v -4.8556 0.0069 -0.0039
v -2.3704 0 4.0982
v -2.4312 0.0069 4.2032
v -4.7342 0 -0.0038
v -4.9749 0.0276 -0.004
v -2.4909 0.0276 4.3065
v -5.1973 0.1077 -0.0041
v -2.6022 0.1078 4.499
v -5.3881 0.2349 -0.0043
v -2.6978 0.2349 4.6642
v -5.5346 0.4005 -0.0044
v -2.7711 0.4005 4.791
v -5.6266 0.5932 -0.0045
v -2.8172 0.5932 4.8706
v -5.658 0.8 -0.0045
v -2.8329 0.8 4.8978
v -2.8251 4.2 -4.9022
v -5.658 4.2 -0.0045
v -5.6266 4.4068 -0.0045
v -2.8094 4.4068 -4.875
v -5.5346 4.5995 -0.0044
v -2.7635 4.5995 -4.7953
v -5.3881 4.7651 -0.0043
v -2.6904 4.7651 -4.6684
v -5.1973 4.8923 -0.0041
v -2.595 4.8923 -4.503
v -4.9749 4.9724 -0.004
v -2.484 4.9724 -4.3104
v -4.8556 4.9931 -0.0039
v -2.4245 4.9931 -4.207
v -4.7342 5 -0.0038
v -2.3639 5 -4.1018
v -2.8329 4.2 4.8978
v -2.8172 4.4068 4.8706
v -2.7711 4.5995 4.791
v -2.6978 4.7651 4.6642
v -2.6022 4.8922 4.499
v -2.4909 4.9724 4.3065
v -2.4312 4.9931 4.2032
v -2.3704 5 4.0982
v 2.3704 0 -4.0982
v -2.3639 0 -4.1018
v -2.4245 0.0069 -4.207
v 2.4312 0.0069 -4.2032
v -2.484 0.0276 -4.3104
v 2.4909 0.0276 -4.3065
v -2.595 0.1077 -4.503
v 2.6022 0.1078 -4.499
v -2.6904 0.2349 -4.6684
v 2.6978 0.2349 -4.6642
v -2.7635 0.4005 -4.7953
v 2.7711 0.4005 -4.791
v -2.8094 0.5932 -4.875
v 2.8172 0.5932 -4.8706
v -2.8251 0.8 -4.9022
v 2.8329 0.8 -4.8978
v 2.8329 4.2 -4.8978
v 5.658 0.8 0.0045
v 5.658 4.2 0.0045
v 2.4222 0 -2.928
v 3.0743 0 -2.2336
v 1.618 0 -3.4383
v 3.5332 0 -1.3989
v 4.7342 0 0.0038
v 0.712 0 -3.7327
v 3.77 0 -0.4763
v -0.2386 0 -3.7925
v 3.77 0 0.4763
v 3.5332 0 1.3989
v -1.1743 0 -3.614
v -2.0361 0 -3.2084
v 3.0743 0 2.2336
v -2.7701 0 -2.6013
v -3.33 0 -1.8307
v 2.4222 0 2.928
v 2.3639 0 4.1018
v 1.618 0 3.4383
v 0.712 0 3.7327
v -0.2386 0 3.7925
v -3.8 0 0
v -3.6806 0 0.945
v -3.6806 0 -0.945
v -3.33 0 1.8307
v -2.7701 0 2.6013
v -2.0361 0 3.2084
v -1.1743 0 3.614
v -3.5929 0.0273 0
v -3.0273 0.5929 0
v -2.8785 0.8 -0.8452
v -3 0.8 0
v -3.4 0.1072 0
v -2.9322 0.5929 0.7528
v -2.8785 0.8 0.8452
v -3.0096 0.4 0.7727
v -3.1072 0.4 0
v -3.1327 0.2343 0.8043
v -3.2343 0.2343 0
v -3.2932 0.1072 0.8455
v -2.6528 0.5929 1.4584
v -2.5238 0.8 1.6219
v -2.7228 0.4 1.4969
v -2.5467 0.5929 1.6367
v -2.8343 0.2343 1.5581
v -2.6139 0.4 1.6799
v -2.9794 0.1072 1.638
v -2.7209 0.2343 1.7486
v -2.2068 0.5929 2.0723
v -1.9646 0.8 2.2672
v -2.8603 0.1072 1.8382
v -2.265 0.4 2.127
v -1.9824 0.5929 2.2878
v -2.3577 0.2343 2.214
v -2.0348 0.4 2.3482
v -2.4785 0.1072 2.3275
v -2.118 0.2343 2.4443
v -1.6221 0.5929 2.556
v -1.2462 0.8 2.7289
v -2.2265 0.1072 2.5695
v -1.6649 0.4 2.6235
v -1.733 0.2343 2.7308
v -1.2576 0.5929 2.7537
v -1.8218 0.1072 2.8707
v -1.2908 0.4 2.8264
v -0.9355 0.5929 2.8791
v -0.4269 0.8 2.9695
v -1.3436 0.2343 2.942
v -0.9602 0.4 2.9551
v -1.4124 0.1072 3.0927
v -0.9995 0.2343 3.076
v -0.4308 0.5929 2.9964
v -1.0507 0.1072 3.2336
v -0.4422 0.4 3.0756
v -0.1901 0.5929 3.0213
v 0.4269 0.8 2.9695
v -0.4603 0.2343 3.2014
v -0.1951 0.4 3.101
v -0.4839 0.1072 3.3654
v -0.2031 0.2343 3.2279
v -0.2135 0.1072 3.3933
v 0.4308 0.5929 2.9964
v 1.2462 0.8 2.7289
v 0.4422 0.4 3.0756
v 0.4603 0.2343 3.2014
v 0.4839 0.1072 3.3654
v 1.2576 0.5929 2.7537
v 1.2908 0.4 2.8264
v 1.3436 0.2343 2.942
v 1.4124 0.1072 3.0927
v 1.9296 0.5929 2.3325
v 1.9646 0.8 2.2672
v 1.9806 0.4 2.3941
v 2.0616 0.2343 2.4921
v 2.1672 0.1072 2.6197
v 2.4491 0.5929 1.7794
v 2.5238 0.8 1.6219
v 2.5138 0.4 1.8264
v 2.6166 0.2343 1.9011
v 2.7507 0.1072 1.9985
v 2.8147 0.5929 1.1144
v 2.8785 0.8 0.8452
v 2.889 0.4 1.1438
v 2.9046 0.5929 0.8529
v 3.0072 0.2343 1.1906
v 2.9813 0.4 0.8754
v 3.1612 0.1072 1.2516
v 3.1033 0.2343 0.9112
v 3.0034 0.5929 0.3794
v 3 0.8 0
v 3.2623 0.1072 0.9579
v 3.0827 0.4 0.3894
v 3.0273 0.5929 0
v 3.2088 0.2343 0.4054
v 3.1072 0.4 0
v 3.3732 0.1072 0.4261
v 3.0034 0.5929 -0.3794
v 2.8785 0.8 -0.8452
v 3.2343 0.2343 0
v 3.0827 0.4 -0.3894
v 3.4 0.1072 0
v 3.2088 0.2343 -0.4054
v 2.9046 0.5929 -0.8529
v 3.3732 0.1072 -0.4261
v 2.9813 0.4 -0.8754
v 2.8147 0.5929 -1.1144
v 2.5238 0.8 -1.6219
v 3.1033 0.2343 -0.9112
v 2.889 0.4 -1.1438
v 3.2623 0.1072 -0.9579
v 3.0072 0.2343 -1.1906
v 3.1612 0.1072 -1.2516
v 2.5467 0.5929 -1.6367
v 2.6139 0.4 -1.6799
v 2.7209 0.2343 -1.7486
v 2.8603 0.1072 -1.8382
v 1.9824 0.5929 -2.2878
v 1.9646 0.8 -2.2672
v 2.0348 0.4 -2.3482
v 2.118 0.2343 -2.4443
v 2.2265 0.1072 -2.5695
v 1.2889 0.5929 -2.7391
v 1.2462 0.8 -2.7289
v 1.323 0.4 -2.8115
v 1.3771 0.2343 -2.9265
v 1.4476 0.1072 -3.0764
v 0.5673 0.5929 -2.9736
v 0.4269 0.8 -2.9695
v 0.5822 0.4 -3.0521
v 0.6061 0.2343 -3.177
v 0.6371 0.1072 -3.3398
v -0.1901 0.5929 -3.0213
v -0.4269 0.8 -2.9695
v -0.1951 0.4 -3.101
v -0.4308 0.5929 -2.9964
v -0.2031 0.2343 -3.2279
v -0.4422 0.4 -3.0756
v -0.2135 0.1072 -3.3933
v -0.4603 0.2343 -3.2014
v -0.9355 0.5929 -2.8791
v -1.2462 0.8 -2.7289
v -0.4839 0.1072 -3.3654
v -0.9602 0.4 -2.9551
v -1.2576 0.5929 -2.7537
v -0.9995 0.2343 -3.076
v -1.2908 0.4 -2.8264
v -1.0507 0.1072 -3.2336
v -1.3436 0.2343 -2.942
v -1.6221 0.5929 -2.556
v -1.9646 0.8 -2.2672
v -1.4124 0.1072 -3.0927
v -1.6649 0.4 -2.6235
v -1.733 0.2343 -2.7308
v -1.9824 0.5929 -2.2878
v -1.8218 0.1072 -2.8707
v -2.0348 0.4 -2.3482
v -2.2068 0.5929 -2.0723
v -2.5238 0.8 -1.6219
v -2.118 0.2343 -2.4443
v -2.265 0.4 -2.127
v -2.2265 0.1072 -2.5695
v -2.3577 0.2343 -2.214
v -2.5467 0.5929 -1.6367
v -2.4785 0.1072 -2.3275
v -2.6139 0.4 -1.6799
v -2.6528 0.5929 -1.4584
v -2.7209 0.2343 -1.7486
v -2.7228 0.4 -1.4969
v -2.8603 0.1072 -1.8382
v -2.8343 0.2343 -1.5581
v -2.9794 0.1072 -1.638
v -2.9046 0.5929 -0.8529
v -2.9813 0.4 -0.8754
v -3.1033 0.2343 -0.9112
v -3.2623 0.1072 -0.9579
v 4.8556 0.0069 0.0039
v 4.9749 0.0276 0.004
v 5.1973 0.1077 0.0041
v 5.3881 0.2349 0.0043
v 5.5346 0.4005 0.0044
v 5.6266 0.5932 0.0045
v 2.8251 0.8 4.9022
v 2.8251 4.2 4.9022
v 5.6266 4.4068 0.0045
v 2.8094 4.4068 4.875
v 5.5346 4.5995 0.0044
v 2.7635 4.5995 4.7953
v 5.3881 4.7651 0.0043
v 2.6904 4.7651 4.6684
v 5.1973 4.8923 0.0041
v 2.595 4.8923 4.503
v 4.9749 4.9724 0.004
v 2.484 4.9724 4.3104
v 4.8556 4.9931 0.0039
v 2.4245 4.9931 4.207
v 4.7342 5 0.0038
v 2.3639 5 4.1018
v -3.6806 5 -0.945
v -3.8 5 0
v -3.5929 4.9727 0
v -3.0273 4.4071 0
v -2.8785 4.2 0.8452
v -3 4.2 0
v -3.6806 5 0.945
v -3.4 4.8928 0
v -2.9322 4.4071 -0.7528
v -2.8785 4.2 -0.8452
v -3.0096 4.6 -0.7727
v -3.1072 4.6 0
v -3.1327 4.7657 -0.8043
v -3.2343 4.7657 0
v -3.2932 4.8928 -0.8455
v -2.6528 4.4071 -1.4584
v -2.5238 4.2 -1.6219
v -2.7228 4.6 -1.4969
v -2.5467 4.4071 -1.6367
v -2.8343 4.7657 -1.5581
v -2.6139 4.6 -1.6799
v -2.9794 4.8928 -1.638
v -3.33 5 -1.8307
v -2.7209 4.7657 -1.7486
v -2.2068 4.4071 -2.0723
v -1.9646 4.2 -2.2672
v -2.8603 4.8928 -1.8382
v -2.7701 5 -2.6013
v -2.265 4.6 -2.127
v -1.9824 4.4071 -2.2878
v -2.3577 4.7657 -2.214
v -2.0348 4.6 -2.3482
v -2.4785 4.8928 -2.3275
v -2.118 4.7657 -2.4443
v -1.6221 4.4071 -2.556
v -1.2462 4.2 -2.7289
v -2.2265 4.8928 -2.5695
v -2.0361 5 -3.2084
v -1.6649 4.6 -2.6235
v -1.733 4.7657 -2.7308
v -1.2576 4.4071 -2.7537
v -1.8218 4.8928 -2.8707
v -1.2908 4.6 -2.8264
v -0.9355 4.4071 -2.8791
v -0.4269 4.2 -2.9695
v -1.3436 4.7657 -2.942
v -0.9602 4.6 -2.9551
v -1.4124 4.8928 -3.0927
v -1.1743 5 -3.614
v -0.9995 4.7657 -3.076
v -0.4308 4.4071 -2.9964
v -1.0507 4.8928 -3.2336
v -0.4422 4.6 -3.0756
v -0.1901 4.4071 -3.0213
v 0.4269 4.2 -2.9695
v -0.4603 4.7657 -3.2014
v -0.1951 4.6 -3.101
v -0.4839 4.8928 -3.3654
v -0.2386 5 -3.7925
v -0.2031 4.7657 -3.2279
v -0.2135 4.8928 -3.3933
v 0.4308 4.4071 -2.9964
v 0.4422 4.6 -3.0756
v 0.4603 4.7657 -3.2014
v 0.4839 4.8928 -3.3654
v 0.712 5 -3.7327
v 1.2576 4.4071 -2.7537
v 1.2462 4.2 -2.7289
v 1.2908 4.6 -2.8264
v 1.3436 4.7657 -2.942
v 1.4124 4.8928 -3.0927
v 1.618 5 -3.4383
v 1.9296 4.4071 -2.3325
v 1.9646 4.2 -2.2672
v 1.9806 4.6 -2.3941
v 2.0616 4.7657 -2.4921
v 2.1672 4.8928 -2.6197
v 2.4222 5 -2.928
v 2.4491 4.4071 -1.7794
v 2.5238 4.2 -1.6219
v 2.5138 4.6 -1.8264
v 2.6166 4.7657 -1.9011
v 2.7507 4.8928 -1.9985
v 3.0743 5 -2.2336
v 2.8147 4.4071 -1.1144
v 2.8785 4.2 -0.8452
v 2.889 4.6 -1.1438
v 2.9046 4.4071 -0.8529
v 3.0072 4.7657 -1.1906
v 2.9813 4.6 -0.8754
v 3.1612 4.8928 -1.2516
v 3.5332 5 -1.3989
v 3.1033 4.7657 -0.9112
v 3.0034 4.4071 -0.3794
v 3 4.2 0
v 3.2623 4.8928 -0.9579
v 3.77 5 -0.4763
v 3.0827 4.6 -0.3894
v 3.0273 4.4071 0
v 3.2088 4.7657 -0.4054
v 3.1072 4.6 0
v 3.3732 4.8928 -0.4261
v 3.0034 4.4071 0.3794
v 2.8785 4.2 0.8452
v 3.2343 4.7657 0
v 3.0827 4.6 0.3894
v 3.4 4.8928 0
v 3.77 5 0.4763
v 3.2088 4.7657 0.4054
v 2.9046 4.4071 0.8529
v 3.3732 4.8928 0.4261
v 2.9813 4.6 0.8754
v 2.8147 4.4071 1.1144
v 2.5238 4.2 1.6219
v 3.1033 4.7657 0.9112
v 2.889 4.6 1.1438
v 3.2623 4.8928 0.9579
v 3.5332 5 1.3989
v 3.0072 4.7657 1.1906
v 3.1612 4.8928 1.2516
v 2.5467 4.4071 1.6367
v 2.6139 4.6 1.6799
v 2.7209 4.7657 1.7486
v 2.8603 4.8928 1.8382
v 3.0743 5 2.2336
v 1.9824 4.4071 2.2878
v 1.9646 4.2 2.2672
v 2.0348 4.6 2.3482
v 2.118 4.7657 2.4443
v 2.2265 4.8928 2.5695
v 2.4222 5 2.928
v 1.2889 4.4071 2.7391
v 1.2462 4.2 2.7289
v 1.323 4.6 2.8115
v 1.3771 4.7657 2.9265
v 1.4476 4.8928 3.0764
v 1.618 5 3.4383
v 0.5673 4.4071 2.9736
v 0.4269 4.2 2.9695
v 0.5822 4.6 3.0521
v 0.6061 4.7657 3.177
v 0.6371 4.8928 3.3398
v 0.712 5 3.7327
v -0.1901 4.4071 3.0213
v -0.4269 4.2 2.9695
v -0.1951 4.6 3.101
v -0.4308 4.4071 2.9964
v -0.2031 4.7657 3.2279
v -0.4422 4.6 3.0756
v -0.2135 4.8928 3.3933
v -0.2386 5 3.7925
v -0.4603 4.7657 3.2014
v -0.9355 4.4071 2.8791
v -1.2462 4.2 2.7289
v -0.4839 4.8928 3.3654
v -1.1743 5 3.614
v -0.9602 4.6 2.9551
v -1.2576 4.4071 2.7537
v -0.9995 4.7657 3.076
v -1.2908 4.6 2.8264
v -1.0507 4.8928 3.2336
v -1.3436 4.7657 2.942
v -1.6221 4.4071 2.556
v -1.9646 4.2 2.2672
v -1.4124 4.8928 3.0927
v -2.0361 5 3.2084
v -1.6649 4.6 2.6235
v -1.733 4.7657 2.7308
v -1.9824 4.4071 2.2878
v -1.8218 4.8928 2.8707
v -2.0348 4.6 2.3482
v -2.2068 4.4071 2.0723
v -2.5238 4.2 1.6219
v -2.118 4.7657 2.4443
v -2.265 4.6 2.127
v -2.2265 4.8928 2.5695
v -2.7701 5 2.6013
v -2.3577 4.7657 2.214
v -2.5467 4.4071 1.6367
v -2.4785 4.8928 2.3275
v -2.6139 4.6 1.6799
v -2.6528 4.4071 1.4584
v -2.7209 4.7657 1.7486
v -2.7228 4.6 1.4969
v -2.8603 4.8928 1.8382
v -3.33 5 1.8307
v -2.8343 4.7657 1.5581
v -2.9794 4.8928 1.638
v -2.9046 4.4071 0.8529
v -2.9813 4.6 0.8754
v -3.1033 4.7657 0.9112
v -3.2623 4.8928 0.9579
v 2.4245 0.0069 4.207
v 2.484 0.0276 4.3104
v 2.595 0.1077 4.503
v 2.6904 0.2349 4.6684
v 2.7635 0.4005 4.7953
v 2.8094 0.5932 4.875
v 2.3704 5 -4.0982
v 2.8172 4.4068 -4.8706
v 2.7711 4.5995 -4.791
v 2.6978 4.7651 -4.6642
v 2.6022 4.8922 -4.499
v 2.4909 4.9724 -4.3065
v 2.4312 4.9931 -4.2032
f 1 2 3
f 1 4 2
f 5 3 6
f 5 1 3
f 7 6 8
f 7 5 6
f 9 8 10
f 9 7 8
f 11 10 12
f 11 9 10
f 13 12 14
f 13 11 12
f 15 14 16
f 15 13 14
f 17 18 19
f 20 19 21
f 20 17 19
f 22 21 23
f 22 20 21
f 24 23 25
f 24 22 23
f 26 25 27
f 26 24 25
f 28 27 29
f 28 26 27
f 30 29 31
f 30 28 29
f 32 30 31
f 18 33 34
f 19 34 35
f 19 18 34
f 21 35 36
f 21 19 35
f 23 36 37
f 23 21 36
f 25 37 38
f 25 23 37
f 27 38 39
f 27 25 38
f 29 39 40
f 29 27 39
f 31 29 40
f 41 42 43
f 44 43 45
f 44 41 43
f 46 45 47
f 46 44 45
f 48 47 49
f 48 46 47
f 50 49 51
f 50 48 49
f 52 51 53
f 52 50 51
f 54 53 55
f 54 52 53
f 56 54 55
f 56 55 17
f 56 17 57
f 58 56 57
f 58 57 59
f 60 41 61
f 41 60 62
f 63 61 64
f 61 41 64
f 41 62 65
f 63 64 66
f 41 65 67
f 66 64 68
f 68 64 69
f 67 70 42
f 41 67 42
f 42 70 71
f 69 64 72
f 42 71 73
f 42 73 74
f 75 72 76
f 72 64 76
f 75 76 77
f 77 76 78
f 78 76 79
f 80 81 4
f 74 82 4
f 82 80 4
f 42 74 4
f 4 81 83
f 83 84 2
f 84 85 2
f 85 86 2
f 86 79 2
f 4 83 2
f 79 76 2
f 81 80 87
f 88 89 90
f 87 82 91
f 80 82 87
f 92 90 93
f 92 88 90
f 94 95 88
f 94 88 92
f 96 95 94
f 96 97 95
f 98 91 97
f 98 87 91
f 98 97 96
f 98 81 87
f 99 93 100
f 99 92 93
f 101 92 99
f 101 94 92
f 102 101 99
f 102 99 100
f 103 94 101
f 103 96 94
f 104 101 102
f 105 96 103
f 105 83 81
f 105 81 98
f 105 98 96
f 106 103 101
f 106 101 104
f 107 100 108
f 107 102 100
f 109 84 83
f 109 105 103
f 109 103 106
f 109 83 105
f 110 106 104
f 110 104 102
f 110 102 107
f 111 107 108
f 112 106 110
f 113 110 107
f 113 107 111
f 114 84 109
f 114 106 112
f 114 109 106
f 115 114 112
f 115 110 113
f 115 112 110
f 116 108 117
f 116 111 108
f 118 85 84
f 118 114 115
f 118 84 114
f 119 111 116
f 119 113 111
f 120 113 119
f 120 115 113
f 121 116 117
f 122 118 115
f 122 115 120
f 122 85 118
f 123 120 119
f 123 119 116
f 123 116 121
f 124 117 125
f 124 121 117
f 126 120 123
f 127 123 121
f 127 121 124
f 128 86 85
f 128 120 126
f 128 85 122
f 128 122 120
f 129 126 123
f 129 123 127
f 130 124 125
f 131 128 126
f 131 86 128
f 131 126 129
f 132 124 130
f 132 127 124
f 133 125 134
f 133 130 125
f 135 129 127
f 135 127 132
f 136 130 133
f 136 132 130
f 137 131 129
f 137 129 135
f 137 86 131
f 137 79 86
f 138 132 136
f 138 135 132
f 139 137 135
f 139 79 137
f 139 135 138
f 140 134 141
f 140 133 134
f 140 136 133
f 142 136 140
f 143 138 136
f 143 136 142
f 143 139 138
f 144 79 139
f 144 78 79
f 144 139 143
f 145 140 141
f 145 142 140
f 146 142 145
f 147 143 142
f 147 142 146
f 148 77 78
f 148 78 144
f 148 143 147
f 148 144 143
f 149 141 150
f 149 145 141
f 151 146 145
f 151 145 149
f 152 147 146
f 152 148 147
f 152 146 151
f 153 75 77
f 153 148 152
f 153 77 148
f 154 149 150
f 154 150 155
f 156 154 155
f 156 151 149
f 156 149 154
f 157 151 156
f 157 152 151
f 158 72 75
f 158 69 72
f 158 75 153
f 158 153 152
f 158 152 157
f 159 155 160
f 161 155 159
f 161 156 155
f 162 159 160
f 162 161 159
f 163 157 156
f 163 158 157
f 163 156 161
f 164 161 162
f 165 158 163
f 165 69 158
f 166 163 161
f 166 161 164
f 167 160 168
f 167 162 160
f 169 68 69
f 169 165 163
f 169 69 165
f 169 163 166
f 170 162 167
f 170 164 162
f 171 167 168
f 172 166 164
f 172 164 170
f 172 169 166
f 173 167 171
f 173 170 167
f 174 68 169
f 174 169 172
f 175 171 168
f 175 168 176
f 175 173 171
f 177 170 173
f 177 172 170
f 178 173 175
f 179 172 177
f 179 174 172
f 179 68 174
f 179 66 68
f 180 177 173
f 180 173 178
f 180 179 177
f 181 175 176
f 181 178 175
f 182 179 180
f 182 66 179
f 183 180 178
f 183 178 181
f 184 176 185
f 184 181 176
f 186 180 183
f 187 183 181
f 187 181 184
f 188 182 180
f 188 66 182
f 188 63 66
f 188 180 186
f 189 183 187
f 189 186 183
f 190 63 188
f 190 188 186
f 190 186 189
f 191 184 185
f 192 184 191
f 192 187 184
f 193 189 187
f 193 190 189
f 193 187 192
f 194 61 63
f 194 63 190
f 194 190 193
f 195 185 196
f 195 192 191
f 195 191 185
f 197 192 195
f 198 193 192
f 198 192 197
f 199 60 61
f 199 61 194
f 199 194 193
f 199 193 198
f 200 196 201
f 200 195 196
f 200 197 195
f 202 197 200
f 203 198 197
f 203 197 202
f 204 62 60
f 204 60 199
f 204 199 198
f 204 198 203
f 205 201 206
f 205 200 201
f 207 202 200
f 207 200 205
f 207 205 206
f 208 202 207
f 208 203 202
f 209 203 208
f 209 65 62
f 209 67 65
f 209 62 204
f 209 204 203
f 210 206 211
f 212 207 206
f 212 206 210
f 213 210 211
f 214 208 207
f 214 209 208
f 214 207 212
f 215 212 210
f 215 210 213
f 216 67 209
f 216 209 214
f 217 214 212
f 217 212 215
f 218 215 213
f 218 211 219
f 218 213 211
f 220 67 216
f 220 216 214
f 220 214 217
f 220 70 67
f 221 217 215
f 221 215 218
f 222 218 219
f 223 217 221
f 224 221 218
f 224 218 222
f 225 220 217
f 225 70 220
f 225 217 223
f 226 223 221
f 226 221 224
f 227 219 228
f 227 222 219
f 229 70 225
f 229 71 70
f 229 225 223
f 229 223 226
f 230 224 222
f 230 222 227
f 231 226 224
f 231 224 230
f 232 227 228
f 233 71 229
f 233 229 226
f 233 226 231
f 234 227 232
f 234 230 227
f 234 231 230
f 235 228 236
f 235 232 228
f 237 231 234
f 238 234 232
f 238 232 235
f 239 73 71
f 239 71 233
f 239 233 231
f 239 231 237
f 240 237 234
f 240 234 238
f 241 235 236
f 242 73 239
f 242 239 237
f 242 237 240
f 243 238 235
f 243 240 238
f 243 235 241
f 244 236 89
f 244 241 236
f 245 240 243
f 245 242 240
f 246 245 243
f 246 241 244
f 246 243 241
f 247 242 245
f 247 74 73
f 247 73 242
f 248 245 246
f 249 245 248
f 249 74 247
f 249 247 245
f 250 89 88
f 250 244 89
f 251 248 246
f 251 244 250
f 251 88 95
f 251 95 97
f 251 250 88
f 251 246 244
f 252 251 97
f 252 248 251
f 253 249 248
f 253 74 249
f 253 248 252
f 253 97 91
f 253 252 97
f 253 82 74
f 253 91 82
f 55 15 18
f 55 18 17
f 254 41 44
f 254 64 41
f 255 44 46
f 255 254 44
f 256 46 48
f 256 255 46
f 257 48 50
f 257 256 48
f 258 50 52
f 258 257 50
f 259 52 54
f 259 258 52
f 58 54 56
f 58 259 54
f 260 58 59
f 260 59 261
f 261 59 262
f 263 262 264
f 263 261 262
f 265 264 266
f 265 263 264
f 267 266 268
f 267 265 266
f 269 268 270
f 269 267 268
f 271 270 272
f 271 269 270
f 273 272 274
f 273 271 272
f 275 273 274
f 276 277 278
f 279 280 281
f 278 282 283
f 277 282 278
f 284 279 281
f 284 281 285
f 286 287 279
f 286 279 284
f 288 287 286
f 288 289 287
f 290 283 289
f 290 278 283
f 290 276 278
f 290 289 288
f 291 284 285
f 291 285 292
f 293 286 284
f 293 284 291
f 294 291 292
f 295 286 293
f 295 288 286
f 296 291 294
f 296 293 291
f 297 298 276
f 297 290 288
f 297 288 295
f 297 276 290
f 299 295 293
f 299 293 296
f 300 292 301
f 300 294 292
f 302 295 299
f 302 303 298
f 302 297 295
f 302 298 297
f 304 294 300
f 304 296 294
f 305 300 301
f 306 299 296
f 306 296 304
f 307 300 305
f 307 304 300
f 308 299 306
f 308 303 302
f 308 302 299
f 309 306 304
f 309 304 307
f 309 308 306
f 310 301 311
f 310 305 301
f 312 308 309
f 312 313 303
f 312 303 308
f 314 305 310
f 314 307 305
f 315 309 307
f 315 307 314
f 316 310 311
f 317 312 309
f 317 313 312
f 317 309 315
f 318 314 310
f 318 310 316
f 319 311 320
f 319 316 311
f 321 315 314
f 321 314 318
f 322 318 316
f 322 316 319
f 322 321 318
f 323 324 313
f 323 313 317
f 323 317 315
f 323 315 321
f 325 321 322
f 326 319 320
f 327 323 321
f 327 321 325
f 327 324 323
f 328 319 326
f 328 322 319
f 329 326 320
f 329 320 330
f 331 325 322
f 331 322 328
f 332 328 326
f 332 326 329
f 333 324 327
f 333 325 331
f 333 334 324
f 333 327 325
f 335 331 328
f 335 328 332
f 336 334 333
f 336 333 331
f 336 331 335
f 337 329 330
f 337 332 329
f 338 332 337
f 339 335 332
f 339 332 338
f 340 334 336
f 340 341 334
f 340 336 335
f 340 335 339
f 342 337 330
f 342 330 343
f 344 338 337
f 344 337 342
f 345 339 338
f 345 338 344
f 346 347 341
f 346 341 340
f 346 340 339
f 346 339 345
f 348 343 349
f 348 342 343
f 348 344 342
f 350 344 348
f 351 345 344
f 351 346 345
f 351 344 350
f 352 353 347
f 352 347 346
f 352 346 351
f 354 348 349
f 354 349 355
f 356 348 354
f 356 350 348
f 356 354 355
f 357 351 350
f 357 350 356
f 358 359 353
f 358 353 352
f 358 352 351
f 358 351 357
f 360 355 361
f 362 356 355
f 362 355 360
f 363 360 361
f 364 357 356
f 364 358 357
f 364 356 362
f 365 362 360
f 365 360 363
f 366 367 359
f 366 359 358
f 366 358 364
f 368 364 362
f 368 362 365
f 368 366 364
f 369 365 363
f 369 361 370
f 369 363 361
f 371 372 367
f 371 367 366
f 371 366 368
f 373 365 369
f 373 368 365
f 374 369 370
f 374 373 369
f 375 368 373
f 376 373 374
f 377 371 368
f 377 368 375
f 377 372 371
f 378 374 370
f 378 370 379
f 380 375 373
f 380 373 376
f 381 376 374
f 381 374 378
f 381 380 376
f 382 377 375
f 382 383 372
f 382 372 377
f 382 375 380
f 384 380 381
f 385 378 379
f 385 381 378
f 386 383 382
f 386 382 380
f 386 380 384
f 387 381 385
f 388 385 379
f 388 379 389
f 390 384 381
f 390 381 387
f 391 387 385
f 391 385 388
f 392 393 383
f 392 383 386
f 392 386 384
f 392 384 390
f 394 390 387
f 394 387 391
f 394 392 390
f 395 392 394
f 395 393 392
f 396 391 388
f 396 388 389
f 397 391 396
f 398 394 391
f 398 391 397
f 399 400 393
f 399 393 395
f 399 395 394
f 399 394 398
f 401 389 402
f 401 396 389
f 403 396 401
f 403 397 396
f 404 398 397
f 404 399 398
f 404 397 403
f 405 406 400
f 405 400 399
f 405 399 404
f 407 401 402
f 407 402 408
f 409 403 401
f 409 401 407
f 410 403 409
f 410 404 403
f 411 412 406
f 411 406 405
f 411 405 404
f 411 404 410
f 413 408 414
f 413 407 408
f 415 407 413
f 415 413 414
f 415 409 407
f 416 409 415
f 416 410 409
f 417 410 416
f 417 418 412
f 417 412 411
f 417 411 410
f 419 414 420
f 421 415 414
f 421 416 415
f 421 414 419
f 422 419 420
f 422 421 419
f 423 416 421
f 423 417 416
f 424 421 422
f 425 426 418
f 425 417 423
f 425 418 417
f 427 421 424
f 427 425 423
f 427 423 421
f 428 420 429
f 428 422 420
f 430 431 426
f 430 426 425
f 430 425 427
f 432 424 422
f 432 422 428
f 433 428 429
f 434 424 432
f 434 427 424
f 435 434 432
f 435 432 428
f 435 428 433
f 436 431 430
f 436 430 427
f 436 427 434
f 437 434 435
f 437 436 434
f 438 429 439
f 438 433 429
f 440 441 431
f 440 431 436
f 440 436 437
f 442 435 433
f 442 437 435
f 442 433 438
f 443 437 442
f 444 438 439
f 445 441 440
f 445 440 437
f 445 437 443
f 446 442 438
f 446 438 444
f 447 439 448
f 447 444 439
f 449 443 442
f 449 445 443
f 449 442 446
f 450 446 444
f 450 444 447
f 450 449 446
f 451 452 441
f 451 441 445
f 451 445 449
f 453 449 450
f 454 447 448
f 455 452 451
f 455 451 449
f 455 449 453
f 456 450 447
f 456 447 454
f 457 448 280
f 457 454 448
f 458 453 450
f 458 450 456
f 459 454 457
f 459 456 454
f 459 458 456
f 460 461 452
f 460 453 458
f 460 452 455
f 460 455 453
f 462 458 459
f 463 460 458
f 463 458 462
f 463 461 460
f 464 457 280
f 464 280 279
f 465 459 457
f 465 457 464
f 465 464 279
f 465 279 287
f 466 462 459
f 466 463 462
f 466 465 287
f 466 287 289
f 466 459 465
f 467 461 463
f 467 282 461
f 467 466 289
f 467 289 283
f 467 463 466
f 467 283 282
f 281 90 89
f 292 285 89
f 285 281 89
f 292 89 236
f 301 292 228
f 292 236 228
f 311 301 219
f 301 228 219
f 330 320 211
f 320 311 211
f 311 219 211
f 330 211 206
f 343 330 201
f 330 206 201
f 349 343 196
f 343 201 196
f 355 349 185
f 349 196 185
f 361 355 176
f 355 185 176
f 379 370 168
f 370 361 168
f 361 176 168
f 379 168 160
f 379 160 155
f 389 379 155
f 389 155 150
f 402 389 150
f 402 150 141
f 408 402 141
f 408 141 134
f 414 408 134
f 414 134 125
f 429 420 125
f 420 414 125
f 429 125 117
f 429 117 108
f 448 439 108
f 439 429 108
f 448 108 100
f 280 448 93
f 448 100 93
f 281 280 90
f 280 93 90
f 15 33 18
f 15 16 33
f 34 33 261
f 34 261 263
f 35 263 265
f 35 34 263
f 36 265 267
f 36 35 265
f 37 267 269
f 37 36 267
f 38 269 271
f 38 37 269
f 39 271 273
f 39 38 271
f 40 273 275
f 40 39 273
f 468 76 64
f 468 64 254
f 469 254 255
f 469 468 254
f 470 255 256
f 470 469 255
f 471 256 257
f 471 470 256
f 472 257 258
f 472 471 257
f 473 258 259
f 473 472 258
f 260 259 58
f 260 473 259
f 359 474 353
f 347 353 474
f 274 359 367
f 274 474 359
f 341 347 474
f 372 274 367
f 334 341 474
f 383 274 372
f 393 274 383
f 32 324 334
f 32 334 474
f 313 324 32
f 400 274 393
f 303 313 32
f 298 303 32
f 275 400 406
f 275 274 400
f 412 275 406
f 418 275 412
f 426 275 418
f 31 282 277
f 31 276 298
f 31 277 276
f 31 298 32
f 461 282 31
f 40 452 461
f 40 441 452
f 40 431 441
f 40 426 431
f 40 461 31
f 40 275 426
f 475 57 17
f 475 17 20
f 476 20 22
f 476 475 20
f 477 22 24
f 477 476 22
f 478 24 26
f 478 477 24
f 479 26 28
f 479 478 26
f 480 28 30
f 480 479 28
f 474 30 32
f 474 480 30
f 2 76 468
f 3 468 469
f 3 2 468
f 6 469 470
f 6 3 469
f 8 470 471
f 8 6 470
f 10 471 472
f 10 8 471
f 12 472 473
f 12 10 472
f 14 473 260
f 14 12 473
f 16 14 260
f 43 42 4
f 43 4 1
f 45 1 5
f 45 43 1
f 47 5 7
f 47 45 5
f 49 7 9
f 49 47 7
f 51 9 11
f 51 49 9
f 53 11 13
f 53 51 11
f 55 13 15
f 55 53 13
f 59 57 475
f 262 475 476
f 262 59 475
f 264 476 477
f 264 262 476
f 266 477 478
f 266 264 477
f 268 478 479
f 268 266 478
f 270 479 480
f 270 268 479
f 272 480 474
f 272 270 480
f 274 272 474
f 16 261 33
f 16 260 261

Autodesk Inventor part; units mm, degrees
ref_plane "YZ Plane" through (0, 0, 0) normal (1, 0, 0) x (0, 1, 0)
sketch "Sketch1" plane through (0, 0, 0) normal (0, 1, 0) x (-1, 0, 0)
  line L0 (2.8251, -4.9022) -> (-2.8329, -4.8978)
  line L1 (-2.8329, -4.8978) -> (-5.658, 0.0045)
  line L2 (-5.658, 0.0045) -> (-2.8251, 4.9022)
  line L3 (-2.8251, 4.9022) -> (2.8329, 4.8978)
  line L4 (2.8329, 4.8978) -> (5.658, -0.0045)
  line L5 (5.658, -0.0045) -> (2.8251, -4.9022)
  circle A0 centre (0, 0) radius 3
  dimension "d0" = 9.8
  dimension "d1" = 6
extrude "Extrusion1" add sketch "Sketch1" along normal blind 5
fillet "Fillet1" radius 0.8 14 edges at (4.2416, 5, 2.4533) (4.2455, 5, -2.4467) (0.0039, 5, -4.9) (-4.2416, 5, -2.4533) (-4.2455, 5, 2.4467) (-0.0039, 5, 4.9) (-0.0039, 0, 4.9) (4.2416, 0, 2.4533) (4.2455, 0, -2.4467) (0.0039, 0, -4.9) (-4.2416, 0, -2.4533) (-4.2455, 0, 2.4467) (3, 5, 0) (3, 0, 0)
thread "Thread1" size "M6x1" class "6H" standard "ANSI Metric M Profile" full length
ref_plane "Work Plane1" through (0, 5, 0) normal (0, 1, 0) x (1, 0, 0)
ref_plane "Work Plane2" through (0, 0, 0) normal (0, -1, 0) x (1, 0, 0)
properties part number "m6nut"
